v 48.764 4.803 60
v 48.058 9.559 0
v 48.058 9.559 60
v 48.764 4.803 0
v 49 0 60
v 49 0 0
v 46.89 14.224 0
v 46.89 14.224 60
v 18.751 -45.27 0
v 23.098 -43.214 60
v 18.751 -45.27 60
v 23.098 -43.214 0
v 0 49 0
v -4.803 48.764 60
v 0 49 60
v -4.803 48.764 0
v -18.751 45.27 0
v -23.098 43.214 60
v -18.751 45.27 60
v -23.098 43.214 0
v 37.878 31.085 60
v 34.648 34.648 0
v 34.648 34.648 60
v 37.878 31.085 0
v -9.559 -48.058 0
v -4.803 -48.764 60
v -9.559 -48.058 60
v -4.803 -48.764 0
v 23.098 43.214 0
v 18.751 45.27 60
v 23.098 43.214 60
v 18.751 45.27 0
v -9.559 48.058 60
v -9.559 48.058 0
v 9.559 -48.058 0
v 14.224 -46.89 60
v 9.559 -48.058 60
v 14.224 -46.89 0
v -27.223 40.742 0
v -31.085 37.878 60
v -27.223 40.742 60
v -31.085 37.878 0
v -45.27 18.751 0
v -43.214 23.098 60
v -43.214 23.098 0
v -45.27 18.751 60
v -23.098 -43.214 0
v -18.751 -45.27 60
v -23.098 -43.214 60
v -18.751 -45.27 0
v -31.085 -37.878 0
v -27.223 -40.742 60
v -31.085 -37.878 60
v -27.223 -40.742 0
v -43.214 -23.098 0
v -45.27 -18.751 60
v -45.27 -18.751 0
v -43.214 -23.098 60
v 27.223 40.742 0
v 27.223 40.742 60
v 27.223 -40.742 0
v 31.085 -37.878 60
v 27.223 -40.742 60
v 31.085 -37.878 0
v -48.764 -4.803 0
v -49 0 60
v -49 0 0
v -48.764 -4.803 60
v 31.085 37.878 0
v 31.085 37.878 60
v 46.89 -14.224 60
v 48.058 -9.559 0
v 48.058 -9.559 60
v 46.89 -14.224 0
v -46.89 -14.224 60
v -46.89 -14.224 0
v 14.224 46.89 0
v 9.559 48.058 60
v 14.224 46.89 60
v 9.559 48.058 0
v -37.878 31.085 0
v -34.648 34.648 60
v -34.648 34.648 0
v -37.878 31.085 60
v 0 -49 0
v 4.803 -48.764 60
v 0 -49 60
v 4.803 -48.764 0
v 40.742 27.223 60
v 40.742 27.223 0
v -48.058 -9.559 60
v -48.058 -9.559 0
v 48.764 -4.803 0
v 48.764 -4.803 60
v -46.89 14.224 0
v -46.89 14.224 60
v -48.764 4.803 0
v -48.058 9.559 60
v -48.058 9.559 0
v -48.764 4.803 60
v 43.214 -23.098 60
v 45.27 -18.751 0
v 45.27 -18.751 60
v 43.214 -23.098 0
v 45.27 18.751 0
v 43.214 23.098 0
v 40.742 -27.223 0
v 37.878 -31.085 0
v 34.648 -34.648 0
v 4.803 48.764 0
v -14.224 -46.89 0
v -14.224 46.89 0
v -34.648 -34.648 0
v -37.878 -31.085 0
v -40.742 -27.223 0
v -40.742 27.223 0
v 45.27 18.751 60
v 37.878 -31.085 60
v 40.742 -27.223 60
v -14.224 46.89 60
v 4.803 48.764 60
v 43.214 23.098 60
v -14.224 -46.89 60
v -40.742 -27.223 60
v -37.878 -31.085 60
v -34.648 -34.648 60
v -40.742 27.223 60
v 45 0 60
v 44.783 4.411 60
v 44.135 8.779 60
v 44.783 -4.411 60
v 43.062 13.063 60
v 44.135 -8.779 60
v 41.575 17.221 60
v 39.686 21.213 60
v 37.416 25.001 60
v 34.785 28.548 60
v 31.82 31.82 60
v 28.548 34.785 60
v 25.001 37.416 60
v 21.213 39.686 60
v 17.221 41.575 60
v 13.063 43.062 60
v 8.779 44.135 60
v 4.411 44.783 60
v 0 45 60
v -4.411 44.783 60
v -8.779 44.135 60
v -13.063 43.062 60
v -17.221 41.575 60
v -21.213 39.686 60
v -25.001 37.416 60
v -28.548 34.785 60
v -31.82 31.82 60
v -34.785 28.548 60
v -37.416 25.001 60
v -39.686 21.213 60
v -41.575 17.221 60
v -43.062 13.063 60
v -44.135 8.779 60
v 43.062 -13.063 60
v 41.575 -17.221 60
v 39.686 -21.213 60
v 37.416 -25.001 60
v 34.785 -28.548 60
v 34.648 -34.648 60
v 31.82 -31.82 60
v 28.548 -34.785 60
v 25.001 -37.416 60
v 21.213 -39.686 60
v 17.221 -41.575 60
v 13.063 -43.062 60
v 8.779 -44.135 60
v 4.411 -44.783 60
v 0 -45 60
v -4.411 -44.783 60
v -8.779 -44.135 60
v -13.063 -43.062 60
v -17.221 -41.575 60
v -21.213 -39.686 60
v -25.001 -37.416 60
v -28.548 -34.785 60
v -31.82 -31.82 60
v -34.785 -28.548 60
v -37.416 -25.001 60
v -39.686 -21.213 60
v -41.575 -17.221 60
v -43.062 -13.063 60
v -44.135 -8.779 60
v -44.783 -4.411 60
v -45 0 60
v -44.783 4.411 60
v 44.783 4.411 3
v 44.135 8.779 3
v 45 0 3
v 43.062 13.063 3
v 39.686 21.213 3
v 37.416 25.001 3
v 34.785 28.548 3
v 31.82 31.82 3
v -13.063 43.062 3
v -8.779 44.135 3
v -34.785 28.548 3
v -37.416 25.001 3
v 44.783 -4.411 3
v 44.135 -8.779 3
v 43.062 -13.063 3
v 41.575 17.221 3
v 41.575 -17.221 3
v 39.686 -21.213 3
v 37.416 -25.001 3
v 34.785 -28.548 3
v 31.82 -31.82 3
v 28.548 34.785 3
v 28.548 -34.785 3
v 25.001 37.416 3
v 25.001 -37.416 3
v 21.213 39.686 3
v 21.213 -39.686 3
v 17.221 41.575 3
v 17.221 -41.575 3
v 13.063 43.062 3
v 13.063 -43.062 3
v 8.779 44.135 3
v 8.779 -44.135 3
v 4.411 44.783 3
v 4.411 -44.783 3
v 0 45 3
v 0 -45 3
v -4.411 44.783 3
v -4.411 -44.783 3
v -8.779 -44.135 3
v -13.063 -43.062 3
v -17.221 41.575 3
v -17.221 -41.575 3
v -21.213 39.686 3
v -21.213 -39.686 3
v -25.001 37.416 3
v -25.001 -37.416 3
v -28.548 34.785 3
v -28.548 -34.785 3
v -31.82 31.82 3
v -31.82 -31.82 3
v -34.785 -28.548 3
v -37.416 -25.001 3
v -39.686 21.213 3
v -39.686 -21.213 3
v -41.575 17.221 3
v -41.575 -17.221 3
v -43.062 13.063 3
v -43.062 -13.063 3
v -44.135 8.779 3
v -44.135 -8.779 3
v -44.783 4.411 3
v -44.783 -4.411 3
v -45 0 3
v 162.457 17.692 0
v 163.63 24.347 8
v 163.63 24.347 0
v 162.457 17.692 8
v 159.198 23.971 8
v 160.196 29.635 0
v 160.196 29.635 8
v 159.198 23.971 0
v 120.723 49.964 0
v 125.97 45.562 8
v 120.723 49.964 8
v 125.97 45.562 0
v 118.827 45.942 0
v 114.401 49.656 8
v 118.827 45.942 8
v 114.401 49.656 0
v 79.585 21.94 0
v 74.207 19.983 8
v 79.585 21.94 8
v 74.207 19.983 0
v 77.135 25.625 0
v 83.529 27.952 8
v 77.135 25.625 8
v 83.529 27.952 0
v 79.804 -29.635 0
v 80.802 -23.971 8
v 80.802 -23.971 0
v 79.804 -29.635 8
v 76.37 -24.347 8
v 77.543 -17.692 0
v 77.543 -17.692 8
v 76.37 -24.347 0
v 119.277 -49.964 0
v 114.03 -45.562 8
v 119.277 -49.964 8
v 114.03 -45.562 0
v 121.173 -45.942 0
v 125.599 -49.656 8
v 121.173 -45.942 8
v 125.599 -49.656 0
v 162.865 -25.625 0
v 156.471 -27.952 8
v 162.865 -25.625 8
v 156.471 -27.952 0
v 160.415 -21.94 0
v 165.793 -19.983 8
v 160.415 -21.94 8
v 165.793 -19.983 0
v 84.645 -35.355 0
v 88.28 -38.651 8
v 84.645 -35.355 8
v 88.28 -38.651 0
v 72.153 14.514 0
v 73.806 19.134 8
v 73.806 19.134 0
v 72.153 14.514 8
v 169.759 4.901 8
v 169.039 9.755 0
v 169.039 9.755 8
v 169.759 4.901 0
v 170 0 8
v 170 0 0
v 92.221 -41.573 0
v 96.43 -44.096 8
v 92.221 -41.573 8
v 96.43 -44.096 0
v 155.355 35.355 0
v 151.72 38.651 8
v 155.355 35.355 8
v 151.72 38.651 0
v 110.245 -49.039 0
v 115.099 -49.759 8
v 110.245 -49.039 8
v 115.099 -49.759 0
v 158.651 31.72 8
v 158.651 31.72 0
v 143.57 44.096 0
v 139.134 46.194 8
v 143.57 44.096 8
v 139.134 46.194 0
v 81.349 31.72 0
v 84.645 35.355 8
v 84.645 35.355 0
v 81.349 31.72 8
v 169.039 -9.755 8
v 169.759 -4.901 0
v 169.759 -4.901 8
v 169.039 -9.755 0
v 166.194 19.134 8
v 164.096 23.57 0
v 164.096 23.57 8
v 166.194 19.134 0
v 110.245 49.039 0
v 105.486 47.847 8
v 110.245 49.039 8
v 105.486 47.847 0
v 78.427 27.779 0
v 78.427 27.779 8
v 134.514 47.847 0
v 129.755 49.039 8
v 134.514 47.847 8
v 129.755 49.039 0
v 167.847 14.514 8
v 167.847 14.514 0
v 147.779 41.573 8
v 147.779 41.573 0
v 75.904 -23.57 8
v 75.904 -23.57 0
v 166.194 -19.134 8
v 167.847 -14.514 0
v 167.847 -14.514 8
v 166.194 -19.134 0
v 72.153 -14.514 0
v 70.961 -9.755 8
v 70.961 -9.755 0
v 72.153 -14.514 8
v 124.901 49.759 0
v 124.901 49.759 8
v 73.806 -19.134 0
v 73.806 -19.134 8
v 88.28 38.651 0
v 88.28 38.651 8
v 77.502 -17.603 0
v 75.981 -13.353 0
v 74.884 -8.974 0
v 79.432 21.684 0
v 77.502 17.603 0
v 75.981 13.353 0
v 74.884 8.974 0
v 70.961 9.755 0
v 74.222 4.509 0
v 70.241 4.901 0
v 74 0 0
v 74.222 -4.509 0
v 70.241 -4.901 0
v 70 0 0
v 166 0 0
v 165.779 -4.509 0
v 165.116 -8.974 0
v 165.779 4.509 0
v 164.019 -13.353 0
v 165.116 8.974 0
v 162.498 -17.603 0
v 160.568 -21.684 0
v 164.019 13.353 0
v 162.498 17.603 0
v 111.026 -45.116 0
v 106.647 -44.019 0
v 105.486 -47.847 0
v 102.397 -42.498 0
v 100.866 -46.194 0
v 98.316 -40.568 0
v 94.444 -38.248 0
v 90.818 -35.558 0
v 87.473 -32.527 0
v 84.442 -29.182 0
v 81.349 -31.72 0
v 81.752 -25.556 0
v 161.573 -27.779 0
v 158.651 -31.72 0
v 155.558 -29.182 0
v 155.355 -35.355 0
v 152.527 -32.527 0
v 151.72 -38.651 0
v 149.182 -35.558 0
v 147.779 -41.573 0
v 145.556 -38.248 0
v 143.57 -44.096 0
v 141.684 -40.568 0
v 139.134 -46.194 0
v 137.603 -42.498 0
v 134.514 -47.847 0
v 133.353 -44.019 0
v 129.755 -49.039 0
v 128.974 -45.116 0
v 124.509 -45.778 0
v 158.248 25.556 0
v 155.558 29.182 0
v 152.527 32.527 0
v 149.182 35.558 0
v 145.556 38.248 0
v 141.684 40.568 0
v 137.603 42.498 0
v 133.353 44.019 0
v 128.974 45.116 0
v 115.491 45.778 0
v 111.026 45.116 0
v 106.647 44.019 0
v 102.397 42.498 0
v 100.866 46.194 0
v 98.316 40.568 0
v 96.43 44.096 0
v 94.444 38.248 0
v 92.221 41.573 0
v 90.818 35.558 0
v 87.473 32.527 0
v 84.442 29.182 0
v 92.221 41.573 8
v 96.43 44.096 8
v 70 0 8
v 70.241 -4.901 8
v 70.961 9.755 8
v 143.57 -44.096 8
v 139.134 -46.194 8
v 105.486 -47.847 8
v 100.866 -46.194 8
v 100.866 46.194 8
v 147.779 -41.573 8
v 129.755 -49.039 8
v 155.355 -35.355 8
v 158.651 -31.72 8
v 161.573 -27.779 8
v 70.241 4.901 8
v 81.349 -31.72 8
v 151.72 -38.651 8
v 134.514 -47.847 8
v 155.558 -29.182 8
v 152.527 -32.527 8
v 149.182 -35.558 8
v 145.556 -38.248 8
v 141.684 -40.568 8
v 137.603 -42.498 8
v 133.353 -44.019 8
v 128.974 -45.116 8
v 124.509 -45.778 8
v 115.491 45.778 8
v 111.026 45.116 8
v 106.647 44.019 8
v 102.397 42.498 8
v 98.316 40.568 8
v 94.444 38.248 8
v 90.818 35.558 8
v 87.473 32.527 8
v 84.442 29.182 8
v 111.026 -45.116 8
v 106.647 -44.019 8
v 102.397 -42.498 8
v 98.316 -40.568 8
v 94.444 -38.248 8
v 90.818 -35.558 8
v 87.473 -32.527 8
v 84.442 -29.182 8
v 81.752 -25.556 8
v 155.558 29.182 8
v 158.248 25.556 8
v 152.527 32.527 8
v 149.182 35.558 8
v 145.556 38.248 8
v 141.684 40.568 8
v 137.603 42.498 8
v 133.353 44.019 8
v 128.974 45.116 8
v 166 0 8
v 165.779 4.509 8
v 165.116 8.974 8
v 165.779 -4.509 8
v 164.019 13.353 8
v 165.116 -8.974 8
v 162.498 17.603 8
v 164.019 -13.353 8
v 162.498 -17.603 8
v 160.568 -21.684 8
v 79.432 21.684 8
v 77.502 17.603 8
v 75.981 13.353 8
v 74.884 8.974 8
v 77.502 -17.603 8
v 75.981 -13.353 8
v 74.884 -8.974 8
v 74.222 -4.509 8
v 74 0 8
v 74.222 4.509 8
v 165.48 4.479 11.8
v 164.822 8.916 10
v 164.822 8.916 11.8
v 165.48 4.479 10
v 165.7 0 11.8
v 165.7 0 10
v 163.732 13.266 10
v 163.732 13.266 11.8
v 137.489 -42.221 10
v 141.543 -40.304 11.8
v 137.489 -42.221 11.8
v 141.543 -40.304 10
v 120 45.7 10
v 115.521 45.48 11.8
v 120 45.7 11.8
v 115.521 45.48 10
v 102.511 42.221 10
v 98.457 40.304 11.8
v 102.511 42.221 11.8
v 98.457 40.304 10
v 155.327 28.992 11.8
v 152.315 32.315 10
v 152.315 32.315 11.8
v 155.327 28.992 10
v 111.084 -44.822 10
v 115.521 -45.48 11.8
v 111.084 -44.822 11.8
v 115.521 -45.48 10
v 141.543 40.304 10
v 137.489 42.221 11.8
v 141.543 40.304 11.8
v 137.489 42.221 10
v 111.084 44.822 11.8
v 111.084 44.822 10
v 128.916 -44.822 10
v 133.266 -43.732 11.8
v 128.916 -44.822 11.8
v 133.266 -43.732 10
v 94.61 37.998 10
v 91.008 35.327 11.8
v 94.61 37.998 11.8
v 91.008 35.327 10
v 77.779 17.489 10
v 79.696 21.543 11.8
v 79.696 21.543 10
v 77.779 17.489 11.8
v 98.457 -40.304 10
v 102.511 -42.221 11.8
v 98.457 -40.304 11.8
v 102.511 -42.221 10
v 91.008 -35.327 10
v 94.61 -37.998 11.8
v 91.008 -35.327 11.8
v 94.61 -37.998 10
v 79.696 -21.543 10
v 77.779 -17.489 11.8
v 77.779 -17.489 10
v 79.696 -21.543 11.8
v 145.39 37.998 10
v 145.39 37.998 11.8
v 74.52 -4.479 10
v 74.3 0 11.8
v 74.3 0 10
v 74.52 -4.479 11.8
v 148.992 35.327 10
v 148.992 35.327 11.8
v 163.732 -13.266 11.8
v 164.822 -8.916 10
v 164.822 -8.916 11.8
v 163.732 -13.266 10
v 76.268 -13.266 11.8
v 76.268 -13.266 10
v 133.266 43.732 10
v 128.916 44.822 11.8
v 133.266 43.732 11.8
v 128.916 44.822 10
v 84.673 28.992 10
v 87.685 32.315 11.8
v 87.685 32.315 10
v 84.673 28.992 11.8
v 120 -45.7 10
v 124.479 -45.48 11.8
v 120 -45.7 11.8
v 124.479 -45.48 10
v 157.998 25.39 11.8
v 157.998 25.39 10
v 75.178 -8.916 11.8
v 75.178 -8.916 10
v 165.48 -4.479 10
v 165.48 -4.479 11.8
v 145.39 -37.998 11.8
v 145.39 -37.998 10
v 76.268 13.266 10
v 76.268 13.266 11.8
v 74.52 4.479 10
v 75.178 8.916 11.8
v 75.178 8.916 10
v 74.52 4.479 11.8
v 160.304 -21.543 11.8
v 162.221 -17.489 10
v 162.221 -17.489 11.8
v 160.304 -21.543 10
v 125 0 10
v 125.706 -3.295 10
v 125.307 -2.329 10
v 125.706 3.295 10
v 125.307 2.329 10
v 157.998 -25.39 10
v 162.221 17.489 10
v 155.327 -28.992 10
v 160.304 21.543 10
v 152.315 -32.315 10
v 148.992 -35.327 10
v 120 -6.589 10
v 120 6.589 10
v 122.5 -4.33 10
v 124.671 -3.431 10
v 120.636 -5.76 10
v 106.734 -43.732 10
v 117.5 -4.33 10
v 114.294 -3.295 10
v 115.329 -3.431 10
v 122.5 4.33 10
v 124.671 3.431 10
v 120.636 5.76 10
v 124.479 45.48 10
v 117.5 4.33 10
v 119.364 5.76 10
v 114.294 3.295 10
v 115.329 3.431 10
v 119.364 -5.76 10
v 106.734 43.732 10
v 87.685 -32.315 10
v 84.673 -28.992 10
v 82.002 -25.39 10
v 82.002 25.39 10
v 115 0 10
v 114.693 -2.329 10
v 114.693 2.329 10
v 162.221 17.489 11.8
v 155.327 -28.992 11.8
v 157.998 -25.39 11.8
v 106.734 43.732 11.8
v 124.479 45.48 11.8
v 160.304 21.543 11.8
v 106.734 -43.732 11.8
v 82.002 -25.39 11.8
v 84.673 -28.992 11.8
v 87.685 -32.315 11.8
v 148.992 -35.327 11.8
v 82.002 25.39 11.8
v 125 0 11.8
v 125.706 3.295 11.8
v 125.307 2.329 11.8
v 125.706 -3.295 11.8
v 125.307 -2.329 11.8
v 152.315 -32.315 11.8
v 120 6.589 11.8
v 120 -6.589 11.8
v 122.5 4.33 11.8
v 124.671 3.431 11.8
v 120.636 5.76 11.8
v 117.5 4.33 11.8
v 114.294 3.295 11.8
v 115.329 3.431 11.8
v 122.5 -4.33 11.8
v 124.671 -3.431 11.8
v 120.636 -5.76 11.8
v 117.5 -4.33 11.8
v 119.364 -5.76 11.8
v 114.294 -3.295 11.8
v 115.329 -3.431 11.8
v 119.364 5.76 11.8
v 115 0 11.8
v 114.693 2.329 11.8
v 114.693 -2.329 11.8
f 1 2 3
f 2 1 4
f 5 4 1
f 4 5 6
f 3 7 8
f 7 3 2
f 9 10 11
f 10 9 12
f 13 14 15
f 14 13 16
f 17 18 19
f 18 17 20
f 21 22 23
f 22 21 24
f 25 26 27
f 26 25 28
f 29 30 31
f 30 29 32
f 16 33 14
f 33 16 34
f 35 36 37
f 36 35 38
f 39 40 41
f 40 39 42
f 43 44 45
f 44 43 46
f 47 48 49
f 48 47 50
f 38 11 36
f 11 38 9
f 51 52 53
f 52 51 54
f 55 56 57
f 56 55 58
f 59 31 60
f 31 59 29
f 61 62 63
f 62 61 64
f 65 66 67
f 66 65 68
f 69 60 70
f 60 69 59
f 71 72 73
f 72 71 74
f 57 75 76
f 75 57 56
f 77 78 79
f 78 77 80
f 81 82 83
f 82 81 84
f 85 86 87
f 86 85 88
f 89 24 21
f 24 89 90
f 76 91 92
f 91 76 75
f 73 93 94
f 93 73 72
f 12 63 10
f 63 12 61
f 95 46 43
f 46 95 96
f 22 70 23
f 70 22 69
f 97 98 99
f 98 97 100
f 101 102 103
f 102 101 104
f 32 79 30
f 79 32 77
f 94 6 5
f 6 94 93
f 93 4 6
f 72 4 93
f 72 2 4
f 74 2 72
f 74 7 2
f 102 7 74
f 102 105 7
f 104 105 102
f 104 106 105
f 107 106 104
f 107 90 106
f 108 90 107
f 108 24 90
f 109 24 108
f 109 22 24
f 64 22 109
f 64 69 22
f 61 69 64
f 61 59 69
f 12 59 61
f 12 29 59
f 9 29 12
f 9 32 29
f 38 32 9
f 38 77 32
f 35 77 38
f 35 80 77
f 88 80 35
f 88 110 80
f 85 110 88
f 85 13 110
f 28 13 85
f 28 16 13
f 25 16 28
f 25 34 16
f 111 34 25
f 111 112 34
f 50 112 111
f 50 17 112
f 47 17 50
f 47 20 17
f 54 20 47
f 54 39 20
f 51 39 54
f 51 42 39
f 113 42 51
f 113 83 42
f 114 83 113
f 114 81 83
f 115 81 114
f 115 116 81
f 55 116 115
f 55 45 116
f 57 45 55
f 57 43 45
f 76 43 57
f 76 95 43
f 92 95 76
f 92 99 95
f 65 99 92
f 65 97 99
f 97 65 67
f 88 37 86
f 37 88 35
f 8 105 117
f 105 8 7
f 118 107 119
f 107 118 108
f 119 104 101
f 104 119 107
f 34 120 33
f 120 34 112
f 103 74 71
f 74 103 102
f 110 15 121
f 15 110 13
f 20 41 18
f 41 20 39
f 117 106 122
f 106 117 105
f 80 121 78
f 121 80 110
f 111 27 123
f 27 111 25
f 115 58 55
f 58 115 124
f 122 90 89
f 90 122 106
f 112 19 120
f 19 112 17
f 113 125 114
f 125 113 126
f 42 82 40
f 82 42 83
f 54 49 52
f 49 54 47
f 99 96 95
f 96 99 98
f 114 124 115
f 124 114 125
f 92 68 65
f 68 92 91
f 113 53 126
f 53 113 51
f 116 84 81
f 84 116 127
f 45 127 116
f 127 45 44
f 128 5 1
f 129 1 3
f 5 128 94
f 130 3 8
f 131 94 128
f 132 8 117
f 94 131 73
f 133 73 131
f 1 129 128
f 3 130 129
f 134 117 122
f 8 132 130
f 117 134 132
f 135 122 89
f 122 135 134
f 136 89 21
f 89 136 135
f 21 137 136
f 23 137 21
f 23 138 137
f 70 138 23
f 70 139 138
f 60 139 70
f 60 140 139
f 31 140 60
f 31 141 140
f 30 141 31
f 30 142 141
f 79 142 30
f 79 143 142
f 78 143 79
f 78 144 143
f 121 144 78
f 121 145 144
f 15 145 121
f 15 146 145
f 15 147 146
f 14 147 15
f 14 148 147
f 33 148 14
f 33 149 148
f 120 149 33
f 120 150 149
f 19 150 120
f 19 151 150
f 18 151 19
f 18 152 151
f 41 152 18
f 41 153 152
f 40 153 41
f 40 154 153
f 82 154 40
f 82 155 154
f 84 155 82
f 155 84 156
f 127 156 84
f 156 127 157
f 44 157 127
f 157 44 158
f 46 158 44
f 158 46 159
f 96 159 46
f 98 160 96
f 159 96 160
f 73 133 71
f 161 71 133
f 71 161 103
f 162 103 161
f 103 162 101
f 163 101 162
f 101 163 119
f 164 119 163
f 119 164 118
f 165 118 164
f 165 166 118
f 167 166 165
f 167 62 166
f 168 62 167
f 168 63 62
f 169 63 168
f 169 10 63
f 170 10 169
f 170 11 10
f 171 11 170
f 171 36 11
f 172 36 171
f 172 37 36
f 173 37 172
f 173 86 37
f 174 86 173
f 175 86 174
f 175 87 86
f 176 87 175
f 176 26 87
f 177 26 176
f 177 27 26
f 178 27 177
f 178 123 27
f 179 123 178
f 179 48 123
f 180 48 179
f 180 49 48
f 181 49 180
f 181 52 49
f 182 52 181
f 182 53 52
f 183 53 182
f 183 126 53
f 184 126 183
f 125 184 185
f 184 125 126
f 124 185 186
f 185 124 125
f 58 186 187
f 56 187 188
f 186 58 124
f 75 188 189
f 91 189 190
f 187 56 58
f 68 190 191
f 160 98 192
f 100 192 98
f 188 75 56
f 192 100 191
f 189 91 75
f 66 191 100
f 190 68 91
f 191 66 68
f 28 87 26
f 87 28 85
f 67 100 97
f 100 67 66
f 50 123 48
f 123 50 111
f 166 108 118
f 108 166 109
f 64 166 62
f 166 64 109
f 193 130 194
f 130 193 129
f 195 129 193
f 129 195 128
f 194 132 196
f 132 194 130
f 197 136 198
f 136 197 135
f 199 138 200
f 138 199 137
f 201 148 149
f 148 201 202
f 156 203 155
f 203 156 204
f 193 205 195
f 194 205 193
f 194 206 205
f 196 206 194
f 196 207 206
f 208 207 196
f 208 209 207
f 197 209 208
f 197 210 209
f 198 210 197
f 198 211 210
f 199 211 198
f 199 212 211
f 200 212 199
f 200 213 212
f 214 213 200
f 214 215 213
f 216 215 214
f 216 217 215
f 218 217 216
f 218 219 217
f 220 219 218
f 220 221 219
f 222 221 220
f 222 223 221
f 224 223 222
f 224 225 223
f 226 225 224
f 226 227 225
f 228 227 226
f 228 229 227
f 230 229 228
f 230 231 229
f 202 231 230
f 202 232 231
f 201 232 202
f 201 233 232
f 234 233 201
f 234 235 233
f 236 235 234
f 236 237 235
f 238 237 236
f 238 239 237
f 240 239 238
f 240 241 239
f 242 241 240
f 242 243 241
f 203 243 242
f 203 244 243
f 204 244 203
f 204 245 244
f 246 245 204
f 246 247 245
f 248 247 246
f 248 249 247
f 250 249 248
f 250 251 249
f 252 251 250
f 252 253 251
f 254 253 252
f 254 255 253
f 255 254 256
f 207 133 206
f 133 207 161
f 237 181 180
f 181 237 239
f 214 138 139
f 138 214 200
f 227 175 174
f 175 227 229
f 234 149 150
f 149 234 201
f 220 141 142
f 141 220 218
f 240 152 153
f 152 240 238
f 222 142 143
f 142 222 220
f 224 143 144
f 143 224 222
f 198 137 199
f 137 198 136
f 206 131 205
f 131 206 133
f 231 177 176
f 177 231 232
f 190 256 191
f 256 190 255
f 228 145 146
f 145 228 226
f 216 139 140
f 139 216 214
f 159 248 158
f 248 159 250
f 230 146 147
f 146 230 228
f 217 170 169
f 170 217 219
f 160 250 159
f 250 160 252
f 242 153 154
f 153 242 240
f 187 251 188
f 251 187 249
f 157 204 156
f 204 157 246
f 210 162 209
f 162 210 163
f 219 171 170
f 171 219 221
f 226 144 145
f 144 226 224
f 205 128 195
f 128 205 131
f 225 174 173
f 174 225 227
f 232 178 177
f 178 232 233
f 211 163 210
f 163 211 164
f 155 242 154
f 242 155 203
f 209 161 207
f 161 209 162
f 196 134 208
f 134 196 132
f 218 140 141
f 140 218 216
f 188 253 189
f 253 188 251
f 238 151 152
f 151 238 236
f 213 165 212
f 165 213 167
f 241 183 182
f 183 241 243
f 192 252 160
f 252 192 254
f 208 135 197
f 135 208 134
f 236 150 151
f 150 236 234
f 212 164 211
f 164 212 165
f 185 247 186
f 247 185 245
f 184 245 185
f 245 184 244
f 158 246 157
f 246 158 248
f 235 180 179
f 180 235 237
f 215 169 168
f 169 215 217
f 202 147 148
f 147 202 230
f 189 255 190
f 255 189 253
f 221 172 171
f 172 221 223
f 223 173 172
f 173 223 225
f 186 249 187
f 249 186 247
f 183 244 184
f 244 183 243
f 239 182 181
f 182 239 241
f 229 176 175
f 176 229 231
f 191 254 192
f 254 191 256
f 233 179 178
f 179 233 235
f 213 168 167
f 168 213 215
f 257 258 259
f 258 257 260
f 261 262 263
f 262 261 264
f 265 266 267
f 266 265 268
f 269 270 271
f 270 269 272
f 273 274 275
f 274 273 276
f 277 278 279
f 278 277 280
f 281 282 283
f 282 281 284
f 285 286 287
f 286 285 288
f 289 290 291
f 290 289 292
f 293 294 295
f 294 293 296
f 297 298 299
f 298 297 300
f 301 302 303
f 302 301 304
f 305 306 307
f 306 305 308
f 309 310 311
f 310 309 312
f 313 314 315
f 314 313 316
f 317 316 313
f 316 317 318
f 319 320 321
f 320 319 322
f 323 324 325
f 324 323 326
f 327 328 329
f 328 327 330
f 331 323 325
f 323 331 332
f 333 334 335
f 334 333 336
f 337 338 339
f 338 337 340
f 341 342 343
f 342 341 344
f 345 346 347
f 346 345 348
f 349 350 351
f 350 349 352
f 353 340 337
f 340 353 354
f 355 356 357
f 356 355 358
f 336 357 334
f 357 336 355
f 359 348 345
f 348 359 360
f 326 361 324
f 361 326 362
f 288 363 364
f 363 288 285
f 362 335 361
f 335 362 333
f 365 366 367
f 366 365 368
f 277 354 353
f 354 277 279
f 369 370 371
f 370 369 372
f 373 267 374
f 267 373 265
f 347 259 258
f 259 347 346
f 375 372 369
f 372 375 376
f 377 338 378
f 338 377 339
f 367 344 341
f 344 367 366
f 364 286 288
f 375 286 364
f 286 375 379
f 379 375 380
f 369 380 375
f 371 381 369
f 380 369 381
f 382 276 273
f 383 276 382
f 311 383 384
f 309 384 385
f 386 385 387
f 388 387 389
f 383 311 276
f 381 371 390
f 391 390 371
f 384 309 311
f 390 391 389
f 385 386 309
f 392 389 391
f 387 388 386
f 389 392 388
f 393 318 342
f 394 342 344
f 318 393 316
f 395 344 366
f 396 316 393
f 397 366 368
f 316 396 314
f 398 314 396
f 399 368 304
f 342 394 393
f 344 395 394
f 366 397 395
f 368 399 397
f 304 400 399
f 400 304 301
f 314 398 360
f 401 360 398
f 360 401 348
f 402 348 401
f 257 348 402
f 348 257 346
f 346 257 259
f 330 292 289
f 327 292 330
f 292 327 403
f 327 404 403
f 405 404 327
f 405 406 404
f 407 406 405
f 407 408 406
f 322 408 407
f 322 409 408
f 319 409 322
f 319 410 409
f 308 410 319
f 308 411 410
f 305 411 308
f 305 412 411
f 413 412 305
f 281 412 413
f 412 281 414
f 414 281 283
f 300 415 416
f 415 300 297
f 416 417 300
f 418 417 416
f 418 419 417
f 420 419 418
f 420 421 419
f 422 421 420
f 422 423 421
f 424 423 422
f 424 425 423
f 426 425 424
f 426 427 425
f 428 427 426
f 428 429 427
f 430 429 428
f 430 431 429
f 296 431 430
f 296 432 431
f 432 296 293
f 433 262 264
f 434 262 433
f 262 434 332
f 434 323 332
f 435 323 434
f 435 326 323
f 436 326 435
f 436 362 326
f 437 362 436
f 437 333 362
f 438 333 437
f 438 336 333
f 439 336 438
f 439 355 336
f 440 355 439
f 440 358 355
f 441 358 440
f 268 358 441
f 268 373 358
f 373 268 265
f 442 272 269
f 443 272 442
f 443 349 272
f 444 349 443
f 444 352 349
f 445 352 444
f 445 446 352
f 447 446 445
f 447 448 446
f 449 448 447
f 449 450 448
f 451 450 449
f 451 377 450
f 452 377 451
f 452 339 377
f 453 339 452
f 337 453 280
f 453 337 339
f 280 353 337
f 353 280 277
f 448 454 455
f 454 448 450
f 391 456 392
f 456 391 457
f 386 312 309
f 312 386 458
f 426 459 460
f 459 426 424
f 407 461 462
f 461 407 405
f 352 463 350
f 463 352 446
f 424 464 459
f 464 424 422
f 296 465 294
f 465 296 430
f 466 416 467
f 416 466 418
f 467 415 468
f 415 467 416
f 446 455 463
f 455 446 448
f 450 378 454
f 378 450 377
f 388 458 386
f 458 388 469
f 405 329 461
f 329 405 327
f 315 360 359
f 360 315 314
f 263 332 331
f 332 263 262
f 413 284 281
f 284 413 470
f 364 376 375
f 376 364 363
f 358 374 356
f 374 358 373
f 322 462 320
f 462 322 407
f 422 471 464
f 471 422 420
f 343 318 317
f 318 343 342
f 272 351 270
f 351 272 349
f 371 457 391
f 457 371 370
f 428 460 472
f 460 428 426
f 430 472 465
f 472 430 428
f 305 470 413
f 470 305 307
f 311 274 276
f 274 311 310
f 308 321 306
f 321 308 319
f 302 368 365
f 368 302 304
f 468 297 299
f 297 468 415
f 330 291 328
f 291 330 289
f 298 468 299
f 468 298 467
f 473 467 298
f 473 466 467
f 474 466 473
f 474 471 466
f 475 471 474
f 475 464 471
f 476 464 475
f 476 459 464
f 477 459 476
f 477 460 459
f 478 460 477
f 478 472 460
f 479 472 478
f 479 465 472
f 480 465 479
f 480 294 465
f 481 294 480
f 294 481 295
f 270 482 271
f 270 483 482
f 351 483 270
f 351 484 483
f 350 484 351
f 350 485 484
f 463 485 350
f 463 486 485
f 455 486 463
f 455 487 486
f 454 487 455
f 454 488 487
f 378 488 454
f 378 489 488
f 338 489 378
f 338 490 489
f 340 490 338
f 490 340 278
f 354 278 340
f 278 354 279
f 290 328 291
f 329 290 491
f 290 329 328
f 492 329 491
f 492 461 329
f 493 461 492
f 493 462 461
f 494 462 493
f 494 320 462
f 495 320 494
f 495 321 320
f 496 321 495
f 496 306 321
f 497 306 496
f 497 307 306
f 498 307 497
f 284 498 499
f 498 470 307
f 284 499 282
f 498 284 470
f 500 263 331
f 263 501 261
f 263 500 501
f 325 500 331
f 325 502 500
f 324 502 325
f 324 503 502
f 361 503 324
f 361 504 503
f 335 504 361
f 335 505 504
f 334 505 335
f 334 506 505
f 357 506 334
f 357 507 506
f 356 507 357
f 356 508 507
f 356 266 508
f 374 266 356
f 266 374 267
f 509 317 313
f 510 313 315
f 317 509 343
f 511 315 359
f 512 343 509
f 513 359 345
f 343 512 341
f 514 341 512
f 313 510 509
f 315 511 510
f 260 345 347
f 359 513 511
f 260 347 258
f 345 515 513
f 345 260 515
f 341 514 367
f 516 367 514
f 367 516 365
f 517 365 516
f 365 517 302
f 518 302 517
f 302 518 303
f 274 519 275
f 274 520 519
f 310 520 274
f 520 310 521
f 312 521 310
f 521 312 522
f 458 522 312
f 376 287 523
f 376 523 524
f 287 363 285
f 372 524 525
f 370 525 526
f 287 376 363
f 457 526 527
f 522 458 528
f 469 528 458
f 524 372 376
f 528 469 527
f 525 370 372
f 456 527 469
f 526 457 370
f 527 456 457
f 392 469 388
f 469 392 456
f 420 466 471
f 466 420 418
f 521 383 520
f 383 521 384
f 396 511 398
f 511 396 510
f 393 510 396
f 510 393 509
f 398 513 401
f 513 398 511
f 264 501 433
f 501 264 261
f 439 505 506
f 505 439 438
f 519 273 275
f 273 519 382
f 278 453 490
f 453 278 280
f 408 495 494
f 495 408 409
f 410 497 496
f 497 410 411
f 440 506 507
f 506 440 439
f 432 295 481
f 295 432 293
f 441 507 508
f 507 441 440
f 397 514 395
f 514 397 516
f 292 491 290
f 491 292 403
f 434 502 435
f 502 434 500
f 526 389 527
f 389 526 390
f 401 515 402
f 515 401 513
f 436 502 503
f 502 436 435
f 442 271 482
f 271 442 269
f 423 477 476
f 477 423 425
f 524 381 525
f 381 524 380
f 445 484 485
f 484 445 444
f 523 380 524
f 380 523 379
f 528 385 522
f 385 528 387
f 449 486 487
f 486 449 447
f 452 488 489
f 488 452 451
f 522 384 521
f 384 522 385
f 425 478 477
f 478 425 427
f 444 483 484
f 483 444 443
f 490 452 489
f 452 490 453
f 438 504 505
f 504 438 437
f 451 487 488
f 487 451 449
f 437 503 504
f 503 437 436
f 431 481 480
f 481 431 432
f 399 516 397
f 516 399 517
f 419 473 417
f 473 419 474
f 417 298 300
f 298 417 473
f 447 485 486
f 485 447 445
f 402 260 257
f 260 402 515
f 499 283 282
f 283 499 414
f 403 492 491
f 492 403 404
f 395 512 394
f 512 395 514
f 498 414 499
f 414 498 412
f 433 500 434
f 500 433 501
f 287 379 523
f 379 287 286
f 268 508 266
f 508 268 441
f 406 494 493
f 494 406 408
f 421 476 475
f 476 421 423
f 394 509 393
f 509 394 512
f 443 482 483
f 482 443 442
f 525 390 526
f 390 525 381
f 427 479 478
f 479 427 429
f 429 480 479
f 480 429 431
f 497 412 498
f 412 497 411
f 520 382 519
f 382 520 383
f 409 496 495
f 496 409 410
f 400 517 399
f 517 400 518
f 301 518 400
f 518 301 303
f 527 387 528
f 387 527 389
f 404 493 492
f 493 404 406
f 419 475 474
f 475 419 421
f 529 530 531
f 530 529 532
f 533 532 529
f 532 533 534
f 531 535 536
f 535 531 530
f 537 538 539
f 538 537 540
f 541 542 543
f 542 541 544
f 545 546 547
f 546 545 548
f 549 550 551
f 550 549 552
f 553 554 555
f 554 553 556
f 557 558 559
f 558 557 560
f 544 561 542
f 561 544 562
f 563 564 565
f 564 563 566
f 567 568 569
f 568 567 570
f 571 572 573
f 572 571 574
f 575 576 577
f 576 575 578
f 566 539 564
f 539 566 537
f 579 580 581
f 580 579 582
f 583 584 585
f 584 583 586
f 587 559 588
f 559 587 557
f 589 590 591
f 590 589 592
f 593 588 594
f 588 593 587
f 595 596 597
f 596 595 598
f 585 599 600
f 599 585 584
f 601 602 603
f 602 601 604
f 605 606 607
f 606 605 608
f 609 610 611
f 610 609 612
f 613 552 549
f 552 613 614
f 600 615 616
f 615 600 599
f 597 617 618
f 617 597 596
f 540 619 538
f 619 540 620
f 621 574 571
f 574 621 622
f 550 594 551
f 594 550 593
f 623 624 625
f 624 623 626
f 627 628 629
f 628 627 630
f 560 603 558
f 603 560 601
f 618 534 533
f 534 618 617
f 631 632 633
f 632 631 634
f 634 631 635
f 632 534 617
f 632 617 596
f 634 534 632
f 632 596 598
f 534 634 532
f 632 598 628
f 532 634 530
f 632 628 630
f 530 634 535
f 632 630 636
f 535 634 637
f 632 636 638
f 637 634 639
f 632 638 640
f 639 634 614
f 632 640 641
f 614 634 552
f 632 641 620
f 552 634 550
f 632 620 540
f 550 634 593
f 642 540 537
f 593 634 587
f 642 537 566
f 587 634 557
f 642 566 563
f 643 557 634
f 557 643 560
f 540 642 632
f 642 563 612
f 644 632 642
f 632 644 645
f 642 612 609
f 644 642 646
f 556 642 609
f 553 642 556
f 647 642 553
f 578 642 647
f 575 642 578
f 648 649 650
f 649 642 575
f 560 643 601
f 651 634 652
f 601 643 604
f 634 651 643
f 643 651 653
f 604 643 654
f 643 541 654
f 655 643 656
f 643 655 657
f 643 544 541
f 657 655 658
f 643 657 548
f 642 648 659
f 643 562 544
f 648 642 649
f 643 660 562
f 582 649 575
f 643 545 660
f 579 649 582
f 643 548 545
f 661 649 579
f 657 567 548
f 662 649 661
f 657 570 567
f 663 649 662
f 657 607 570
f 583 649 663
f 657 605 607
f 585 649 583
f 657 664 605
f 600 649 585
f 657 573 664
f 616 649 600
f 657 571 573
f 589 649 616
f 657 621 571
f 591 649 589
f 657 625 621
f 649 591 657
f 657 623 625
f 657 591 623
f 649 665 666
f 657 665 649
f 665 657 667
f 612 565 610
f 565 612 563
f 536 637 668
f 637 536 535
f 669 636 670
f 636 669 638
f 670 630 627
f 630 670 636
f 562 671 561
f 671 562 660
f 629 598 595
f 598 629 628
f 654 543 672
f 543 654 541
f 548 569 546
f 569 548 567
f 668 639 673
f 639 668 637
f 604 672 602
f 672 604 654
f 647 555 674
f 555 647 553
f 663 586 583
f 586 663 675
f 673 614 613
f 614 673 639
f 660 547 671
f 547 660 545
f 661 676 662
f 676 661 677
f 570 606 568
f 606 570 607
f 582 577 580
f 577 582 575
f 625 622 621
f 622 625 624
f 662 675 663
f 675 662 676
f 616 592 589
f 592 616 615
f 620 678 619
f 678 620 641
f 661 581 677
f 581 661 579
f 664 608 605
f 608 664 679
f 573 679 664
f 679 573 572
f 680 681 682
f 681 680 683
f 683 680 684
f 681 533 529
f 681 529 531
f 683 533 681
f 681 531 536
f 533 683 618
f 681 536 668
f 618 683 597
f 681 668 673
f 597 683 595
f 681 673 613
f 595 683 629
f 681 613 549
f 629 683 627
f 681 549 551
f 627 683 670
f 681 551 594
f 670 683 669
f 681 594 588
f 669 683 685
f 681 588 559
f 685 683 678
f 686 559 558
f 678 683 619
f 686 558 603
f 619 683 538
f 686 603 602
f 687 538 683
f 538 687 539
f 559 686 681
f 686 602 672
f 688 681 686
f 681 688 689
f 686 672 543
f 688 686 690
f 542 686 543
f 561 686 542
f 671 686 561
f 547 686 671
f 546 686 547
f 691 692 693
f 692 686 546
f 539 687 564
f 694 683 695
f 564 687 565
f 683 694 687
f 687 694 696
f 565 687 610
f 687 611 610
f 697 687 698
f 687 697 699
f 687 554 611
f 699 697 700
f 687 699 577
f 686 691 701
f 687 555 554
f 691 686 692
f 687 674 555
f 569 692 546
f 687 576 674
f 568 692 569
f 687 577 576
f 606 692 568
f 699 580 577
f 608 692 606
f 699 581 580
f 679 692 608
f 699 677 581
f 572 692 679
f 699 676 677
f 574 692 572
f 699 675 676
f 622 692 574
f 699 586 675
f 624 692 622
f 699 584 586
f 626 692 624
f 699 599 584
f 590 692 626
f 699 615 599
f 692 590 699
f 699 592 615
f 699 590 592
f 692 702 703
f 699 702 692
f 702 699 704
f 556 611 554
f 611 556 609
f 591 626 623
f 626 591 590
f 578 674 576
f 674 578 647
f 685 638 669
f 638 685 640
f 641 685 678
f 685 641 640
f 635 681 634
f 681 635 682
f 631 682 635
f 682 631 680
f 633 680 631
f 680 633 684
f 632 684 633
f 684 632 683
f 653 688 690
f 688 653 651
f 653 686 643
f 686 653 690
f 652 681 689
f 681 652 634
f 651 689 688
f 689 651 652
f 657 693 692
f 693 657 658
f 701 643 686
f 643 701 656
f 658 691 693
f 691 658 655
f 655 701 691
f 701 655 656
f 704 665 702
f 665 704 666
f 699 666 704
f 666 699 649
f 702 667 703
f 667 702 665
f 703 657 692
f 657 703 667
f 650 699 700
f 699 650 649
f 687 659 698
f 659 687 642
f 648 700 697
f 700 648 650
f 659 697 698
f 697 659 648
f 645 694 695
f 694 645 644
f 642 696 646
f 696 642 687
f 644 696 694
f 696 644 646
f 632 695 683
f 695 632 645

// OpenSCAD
// Mechanical Iris / Aperture Box Lid
// Twist to open — satisfying mechanism
// Print: 0.15mm, 3 walls, 20% infill
// Two parts: base + iris lid (print separately)

BLADES     = 6;
IRIS_D     = 100;   // Outer diameter
IRIS_H     = 8;     // Mechanism height
BLADE_T    = 1.8;   // Blade thickness
HUB_D      = 20;    // Center hub diameter
BOX_H      = 60;    // Box body height
GAP        = 0.3;   // Mechanism clearance

// ─── Iris Blade ──────────────────────────────────────────
module blade() {
    // Teardrop shaped blade
    hull() {
        circle(d = 18, $fn = 24);
        translate([IRIS_D * 0.28, 0]) circle(d = 8, $fn = 16);
    }
}

module iris_ring() {
    // Outer stationary ring
    difference() {
        cylinder(d = IRIS_D, h = IRIS_H, $fn = 64);
        cylinder(d = IRIS_D - 8, h = IRIS_H + 1, $fn = 64);
        // Blade guide slots — curved
        for (i = [0 : BLADES - 1])
            rotate([0, 0, i * 360/BLADES + 15])
                translate([IRIS_D/2 - 12, 0, -1])
                    rotate([0, 0, -25])
                        cube([4 + GAP, 22, IRIS_H + 2]);
    }
}

module iris_rotor() {
    // Inner rotating disc with blades
    difference() {
        cylinder(d = IRIS_D - 8 - GAP*2, h = BLADE_T, $fn = 64);
        cylinder(d = HUB_D + GAP*2, h = BLADE_T + 1, $fn = 32);
    }
    // Blades attached to rotor
    for (i = [0 : BLADES - 1])
        rotate([0, 0, i * 360/BLADES])
            translate([HUB_D/2 + 4, 0, 0])
                linear_extrude(BLADE_T)
                    rotate([0, 0, 30])
                        blade();
}

module box_body() {
    difference() {
        cylinder(d = IRIS_D - 2, h = BOX_H, $fn = 64);
        translate([0, 0, 3])
            cylinder(d = IRIS_D - 10, h = BOX_H, $fn = 64);
    }
}

// Print separately:
translate([0, 0, 0])    box_body();
translate([120, 0, 0])  iris_ring();
translate([120, 0, IRIS_H + 2]) iris_rotor();
